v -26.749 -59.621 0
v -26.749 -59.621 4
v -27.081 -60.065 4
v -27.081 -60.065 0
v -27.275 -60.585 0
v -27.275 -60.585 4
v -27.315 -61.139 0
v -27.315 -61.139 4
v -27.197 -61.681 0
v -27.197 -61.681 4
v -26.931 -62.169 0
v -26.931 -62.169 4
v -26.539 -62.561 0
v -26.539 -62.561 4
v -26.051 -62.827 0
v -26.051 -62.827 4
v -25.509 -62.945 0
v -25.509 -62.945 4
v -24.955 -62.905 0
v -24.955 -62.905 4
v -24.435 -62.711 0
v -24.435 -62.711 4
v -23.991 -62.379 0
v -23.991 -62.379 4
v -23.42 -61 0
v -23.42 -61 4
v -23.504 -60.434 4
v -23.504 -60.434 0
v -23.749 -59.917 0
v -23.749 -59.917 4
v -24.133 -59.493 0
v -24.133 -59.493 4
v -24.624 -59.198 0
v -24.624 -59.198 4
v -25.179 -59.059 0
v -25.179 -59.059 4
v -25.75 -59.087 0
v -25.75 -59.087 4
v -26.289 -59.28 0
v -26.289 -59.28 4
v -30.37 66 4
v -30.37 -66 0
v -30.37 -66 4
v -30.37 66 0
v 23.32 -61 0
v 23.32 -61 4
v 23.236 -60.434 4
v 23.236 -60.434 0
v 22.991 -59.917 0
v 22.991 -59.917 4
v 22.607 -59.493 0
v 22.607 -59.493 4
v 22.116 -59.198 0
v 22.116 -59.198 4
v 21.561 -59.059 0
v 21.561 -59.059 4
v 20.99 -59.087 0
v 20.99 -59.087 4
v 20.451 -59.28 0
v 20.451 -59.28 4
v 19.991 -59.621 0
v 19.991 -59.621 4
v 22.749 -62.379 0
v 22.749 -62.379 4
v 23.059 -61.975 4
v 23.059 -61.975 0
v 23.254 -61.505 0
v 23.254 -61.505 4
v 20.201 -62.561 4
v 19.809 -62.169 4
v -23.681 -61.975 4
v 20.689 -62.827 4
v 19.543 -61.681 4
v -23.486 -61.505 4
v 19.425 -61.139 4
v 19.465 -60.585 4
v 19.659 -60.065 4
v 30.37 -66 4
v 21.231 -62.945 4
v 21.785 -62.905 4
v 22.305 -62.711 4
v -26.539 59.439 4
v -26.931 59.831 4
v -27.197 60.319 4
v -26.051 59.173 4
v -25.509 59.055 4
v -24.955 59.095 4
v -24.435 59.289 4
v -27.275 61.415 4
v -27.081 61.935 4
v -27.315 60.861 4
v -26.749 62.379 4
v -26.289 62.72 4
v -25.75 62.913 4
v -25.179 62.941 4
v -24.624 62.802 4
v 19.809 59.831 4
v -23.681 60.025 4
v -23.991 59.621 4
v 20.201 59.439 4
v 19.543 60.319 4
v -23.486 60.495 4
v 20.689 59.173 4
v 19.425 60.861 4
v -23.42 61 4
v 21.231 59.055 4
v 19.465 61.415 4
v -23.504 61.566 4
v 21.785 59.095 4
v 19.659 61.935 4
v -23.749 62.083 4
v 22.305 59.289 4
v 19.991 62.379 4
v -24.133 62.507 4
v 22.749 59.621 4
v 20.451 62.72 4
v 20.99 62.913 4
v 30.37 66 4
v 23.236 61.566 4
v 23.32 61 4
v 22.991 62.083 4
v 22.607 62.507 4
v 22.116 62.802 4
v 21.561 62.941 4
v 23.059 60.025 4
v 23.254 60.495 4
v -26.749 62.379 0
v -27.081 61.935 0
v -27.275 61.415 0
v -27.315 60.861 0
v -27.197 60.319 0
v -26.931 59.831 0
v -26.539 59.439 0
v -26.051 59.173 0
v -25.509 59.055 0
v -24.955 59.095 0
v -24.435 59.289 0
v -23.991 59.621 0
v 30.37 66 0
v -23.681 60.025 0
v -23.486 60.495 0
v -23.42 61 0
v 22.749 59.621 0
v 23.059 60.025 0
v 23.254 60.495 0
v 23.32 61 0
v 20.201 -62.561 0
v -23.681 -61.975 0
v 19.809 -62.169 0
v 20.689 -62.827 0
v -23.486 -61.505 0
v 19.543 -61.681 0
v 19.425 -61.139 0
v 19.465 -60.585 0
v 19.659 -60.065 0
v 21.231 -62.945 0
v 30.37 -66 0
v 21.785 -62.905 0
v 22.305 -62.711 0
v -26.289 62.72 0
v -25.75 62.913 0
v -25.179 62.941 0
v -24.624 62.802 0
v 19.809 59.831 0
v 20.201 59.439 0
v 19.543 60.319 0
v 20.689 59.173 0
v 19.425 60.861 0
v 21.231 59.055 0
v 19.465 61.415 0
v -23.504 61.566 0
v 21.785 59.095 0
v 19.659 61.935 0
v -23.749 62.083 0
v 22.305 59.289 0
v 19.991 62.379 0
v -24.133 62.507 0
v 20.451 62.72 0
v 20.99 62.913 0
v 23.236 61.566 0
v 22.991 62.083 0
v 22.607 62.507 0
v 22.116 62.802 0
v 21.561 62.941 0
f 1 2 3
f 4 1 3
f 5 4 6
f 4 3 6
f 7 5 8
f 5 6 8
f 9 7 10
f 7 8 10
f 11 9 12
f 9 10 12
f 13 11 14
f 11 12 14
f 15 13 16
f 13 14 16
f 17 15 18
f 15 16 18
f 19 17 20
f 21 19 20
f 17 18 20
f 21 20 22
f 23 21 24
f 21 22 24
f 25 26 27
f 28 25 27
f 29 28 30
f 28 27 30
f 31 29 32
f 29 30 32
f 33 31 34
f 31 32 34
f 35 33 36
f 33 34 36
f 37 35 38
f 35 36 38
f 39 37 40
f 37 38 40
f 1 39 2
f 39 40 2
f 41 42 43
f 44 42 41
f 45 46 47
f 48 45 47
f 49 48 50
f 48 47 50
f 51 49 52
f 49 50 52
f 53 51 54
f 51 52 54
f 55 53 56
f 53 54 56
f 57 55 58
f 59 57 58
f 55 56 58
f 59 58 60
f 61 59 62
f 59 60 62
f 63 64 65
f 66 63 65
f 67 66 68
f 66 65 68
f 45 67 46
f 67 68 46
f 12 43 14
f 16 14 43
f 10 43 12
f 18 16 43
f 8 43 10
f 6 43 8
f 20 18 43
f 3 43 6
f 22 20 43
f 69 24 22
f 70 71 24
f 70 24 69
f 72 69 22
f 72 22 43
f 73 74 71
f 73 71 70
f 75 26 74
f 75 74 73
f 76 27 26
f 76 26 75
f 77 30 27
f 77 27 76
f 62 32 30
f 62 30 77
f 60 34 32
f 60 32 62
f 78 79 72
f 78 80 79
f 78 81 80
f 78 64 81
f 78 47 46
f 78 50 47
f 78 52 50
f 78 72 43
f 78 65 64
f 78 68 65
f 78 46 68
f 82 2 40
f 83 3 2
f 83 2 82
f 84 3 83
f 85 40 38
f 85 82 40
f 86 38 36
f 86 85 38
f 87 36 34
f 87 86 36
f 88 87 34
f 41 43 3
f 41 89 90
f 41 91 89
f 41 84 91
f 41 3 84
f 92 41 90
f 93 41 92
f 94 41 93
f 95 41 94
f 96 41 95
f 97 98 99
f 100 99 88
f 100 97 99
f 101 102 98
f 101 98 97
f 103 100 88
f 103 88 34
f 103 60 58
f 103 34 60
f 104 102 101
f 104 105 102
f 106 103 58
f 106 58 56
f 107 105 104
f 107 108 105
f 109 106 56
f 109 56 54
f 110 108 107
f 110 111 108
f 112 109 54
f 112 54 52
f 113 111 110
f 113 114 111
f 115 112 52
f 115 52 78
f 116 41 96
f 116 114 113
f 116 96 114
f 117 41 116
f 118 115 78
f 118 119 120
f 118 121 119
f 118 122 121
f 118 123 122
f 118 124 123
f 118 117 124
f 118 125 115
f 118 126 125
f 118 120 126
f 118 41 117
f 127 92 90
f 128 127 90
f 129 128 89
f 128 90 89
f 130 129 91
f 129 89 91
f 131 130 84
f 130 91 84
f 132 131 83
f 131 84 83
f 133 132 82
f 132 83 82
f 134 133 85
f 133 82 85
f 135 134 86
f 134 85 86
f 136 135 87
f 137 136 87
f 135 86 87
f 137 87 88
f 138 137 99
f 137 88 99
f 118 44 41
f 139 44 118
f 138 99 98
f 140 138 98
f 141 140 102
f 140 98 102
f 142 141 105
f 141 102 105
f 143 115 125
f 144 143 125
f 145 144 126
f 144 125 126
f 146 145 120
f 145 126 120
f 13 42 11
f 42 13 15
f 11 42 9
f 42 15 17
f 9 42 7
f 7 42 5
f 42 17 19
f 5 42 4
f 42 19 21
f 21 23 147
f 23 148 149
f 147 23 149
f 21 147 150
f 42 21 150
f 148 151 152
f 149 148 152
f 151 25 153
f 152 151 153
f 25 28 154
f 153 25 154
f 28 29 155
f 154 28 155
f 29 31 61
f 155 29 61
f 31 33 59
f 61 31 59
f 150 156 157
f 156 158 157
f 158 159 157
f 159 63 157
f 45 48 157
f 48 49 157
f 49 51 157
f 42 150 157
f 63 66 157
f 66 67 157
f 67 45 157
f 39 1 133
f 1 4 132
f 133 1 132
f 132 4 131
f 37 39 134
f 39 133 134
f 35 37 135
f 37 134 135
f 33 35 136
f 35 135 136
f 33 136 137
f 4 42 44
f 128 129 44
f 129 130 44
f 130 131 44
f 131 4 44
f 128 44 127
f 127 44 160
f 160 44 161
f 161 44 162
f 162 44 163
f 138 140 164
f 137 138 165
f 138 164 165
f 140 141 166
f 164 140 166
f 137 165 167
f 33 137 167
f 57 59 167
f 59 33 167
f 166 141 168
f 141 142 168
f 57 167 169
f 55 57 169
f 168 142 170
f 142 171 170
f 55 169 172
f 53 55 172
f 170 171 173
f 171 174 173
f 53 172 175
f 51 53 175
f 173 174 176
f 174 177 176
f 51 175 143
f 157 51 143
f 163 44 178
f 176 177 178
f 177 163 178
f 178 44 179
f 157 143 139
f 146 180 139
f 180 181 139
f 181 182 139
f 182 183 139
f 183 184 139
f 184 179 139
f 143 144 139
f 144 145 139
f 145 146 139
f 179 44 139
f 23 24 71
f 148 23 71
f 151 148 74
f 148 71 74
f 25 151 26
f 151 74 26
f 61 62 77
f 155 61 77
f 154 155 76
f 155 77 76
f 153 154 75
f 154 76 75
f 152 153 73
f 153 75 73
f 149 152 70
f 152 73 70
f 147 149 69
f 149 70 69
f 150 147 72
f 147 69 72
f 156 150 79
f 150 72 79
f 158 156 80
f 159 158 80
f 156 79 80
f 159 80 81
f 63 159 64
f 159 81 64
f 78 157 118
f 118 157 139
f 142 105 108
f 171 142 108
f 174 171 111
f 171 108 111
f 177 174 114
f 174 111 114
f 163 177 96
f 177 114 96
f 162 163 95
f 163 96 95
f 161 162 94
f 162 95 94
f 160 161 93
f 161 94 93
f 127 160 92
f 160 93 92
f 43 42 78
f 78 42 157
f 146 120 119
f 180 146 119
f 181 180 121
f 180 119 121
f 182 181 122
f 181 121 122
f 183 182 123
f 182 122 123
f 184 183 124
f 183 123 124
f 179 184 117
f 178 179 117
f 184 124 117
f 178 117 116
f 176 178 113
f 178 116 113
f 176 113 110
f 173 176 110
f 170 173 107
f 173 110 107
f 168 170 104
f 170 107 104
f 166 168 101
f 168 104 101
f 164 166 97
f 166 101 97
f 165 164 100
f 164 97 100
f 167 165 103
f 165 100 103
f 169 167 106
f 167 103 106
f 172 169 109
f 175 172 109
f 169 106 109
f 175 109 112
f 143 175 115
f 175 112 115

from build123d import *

# Parameters (mm, degrees)
F0_W     = 60.74
F0_H     = 132
F1_DEPTH = 4
F3_DEPTH = 4


with BuildPart() as f1:
    # F0 (on Top) → F1 (new body)
    with BuildSketch(Plane.XY):
        Rectangle(F0_W, F0_H)
    extrude(amount=F1_DEPTH)

    # F2 (on face) → F3 (cut)
    with BuildSketch(Plane.XY.offset(4)):
        with BuildLine():
            Line((-23.9911417767, 59.6211417767), (-26.7488582233, 62.3788582233))
            ThreePointArc((-26.7488582233, 62.3788582233), (-26.7488582233, 59.6211417767), (-23.9911417767, 59.6211417767))
        make_face()
        with BuildLine():
            ThreePointArc((-23.42, 61), (-24.6237673069, 62.8015650884), (-26.7488582233, 62.3788582233))
            Line((-26.7488582233, 62.3788582233), (-23.9911417767, 59.6211417767))
            ThreePointArc((-23.9911417767, 59.6211417767), (-23.5684349116, 60.2537673069), (-23.42, 61))
        make_face()
        with BuildLine():
            Line((22.7488582233, 59.6211417767), (19.9911417767, 62.3788582233))
            ThreePointArc((19.9911417767, 62.3788582233), (19.9911417767, 59.6211417767), (22.7488582233, 59.6211417767))
        make_face()
        with BuildLine():
            ThreePointArc((23.32, 61), (22.1162326931, 62.8015650884), (19.9911417767, 62.3788582233))
            Line((19.9911417767, 62.3788582233), (22.7488582233, 59.6211417767))
            ThreePointArc((22.7488582233, 59.6211417767), (23.1715650884, 60.2537673069), (23.32, 61))
        make_face()
        with BuildLine():
            ThreePointArc((-23.42, -61), (-24.6237673069, -59.1984349116), (-26.7488582233, -59.6211417767))
            Line((-26.7488582233, -59.6211417767), (-23.9911417767, -62.3788582233))
            ThreePointArc((-23.9911417767, -62.3788582233), (-23.5684349116, -61.7462326931), (-23.42, -61))
        make_face()
        with BuildLine():
            Line((-23.9911417767, -62.3788582233), (-26.7488582233, -59.6211417767))
            ThreePointArc((-26.7488582233, -59.6211417767), (-26.7488582233, -62.3788582233), (-23.9911417767, -62.3788582233))
        make_face()
        with BuildLine():
            ThreePointArc((19.9911417767, -59.6211417767), (19.9911417767, -62.3788582233), (22.7488582233, -62.3788582233))
            Line((22.7488582233, -62.3788582233), (19.9911417767, -59.6211417767))
        make_face()
        with BuildLine():
            Line((19.9911417767, -59.6211417767), (22.7488582233, -62.3788582233))
            ThreePointArc((22.7488582233, -62.3788582233), (23.1715650884, -61.7462326931), (23.32, -61))
            ThreePointArc((23.32, -61), (22.1162326931, -59.1984349116), (19.9911417767, -59.6211417767))
        make_face()
    extrude(amount=-F3_DEPTH, mode=Mode.SUBTRACT)


solid = f1.part
